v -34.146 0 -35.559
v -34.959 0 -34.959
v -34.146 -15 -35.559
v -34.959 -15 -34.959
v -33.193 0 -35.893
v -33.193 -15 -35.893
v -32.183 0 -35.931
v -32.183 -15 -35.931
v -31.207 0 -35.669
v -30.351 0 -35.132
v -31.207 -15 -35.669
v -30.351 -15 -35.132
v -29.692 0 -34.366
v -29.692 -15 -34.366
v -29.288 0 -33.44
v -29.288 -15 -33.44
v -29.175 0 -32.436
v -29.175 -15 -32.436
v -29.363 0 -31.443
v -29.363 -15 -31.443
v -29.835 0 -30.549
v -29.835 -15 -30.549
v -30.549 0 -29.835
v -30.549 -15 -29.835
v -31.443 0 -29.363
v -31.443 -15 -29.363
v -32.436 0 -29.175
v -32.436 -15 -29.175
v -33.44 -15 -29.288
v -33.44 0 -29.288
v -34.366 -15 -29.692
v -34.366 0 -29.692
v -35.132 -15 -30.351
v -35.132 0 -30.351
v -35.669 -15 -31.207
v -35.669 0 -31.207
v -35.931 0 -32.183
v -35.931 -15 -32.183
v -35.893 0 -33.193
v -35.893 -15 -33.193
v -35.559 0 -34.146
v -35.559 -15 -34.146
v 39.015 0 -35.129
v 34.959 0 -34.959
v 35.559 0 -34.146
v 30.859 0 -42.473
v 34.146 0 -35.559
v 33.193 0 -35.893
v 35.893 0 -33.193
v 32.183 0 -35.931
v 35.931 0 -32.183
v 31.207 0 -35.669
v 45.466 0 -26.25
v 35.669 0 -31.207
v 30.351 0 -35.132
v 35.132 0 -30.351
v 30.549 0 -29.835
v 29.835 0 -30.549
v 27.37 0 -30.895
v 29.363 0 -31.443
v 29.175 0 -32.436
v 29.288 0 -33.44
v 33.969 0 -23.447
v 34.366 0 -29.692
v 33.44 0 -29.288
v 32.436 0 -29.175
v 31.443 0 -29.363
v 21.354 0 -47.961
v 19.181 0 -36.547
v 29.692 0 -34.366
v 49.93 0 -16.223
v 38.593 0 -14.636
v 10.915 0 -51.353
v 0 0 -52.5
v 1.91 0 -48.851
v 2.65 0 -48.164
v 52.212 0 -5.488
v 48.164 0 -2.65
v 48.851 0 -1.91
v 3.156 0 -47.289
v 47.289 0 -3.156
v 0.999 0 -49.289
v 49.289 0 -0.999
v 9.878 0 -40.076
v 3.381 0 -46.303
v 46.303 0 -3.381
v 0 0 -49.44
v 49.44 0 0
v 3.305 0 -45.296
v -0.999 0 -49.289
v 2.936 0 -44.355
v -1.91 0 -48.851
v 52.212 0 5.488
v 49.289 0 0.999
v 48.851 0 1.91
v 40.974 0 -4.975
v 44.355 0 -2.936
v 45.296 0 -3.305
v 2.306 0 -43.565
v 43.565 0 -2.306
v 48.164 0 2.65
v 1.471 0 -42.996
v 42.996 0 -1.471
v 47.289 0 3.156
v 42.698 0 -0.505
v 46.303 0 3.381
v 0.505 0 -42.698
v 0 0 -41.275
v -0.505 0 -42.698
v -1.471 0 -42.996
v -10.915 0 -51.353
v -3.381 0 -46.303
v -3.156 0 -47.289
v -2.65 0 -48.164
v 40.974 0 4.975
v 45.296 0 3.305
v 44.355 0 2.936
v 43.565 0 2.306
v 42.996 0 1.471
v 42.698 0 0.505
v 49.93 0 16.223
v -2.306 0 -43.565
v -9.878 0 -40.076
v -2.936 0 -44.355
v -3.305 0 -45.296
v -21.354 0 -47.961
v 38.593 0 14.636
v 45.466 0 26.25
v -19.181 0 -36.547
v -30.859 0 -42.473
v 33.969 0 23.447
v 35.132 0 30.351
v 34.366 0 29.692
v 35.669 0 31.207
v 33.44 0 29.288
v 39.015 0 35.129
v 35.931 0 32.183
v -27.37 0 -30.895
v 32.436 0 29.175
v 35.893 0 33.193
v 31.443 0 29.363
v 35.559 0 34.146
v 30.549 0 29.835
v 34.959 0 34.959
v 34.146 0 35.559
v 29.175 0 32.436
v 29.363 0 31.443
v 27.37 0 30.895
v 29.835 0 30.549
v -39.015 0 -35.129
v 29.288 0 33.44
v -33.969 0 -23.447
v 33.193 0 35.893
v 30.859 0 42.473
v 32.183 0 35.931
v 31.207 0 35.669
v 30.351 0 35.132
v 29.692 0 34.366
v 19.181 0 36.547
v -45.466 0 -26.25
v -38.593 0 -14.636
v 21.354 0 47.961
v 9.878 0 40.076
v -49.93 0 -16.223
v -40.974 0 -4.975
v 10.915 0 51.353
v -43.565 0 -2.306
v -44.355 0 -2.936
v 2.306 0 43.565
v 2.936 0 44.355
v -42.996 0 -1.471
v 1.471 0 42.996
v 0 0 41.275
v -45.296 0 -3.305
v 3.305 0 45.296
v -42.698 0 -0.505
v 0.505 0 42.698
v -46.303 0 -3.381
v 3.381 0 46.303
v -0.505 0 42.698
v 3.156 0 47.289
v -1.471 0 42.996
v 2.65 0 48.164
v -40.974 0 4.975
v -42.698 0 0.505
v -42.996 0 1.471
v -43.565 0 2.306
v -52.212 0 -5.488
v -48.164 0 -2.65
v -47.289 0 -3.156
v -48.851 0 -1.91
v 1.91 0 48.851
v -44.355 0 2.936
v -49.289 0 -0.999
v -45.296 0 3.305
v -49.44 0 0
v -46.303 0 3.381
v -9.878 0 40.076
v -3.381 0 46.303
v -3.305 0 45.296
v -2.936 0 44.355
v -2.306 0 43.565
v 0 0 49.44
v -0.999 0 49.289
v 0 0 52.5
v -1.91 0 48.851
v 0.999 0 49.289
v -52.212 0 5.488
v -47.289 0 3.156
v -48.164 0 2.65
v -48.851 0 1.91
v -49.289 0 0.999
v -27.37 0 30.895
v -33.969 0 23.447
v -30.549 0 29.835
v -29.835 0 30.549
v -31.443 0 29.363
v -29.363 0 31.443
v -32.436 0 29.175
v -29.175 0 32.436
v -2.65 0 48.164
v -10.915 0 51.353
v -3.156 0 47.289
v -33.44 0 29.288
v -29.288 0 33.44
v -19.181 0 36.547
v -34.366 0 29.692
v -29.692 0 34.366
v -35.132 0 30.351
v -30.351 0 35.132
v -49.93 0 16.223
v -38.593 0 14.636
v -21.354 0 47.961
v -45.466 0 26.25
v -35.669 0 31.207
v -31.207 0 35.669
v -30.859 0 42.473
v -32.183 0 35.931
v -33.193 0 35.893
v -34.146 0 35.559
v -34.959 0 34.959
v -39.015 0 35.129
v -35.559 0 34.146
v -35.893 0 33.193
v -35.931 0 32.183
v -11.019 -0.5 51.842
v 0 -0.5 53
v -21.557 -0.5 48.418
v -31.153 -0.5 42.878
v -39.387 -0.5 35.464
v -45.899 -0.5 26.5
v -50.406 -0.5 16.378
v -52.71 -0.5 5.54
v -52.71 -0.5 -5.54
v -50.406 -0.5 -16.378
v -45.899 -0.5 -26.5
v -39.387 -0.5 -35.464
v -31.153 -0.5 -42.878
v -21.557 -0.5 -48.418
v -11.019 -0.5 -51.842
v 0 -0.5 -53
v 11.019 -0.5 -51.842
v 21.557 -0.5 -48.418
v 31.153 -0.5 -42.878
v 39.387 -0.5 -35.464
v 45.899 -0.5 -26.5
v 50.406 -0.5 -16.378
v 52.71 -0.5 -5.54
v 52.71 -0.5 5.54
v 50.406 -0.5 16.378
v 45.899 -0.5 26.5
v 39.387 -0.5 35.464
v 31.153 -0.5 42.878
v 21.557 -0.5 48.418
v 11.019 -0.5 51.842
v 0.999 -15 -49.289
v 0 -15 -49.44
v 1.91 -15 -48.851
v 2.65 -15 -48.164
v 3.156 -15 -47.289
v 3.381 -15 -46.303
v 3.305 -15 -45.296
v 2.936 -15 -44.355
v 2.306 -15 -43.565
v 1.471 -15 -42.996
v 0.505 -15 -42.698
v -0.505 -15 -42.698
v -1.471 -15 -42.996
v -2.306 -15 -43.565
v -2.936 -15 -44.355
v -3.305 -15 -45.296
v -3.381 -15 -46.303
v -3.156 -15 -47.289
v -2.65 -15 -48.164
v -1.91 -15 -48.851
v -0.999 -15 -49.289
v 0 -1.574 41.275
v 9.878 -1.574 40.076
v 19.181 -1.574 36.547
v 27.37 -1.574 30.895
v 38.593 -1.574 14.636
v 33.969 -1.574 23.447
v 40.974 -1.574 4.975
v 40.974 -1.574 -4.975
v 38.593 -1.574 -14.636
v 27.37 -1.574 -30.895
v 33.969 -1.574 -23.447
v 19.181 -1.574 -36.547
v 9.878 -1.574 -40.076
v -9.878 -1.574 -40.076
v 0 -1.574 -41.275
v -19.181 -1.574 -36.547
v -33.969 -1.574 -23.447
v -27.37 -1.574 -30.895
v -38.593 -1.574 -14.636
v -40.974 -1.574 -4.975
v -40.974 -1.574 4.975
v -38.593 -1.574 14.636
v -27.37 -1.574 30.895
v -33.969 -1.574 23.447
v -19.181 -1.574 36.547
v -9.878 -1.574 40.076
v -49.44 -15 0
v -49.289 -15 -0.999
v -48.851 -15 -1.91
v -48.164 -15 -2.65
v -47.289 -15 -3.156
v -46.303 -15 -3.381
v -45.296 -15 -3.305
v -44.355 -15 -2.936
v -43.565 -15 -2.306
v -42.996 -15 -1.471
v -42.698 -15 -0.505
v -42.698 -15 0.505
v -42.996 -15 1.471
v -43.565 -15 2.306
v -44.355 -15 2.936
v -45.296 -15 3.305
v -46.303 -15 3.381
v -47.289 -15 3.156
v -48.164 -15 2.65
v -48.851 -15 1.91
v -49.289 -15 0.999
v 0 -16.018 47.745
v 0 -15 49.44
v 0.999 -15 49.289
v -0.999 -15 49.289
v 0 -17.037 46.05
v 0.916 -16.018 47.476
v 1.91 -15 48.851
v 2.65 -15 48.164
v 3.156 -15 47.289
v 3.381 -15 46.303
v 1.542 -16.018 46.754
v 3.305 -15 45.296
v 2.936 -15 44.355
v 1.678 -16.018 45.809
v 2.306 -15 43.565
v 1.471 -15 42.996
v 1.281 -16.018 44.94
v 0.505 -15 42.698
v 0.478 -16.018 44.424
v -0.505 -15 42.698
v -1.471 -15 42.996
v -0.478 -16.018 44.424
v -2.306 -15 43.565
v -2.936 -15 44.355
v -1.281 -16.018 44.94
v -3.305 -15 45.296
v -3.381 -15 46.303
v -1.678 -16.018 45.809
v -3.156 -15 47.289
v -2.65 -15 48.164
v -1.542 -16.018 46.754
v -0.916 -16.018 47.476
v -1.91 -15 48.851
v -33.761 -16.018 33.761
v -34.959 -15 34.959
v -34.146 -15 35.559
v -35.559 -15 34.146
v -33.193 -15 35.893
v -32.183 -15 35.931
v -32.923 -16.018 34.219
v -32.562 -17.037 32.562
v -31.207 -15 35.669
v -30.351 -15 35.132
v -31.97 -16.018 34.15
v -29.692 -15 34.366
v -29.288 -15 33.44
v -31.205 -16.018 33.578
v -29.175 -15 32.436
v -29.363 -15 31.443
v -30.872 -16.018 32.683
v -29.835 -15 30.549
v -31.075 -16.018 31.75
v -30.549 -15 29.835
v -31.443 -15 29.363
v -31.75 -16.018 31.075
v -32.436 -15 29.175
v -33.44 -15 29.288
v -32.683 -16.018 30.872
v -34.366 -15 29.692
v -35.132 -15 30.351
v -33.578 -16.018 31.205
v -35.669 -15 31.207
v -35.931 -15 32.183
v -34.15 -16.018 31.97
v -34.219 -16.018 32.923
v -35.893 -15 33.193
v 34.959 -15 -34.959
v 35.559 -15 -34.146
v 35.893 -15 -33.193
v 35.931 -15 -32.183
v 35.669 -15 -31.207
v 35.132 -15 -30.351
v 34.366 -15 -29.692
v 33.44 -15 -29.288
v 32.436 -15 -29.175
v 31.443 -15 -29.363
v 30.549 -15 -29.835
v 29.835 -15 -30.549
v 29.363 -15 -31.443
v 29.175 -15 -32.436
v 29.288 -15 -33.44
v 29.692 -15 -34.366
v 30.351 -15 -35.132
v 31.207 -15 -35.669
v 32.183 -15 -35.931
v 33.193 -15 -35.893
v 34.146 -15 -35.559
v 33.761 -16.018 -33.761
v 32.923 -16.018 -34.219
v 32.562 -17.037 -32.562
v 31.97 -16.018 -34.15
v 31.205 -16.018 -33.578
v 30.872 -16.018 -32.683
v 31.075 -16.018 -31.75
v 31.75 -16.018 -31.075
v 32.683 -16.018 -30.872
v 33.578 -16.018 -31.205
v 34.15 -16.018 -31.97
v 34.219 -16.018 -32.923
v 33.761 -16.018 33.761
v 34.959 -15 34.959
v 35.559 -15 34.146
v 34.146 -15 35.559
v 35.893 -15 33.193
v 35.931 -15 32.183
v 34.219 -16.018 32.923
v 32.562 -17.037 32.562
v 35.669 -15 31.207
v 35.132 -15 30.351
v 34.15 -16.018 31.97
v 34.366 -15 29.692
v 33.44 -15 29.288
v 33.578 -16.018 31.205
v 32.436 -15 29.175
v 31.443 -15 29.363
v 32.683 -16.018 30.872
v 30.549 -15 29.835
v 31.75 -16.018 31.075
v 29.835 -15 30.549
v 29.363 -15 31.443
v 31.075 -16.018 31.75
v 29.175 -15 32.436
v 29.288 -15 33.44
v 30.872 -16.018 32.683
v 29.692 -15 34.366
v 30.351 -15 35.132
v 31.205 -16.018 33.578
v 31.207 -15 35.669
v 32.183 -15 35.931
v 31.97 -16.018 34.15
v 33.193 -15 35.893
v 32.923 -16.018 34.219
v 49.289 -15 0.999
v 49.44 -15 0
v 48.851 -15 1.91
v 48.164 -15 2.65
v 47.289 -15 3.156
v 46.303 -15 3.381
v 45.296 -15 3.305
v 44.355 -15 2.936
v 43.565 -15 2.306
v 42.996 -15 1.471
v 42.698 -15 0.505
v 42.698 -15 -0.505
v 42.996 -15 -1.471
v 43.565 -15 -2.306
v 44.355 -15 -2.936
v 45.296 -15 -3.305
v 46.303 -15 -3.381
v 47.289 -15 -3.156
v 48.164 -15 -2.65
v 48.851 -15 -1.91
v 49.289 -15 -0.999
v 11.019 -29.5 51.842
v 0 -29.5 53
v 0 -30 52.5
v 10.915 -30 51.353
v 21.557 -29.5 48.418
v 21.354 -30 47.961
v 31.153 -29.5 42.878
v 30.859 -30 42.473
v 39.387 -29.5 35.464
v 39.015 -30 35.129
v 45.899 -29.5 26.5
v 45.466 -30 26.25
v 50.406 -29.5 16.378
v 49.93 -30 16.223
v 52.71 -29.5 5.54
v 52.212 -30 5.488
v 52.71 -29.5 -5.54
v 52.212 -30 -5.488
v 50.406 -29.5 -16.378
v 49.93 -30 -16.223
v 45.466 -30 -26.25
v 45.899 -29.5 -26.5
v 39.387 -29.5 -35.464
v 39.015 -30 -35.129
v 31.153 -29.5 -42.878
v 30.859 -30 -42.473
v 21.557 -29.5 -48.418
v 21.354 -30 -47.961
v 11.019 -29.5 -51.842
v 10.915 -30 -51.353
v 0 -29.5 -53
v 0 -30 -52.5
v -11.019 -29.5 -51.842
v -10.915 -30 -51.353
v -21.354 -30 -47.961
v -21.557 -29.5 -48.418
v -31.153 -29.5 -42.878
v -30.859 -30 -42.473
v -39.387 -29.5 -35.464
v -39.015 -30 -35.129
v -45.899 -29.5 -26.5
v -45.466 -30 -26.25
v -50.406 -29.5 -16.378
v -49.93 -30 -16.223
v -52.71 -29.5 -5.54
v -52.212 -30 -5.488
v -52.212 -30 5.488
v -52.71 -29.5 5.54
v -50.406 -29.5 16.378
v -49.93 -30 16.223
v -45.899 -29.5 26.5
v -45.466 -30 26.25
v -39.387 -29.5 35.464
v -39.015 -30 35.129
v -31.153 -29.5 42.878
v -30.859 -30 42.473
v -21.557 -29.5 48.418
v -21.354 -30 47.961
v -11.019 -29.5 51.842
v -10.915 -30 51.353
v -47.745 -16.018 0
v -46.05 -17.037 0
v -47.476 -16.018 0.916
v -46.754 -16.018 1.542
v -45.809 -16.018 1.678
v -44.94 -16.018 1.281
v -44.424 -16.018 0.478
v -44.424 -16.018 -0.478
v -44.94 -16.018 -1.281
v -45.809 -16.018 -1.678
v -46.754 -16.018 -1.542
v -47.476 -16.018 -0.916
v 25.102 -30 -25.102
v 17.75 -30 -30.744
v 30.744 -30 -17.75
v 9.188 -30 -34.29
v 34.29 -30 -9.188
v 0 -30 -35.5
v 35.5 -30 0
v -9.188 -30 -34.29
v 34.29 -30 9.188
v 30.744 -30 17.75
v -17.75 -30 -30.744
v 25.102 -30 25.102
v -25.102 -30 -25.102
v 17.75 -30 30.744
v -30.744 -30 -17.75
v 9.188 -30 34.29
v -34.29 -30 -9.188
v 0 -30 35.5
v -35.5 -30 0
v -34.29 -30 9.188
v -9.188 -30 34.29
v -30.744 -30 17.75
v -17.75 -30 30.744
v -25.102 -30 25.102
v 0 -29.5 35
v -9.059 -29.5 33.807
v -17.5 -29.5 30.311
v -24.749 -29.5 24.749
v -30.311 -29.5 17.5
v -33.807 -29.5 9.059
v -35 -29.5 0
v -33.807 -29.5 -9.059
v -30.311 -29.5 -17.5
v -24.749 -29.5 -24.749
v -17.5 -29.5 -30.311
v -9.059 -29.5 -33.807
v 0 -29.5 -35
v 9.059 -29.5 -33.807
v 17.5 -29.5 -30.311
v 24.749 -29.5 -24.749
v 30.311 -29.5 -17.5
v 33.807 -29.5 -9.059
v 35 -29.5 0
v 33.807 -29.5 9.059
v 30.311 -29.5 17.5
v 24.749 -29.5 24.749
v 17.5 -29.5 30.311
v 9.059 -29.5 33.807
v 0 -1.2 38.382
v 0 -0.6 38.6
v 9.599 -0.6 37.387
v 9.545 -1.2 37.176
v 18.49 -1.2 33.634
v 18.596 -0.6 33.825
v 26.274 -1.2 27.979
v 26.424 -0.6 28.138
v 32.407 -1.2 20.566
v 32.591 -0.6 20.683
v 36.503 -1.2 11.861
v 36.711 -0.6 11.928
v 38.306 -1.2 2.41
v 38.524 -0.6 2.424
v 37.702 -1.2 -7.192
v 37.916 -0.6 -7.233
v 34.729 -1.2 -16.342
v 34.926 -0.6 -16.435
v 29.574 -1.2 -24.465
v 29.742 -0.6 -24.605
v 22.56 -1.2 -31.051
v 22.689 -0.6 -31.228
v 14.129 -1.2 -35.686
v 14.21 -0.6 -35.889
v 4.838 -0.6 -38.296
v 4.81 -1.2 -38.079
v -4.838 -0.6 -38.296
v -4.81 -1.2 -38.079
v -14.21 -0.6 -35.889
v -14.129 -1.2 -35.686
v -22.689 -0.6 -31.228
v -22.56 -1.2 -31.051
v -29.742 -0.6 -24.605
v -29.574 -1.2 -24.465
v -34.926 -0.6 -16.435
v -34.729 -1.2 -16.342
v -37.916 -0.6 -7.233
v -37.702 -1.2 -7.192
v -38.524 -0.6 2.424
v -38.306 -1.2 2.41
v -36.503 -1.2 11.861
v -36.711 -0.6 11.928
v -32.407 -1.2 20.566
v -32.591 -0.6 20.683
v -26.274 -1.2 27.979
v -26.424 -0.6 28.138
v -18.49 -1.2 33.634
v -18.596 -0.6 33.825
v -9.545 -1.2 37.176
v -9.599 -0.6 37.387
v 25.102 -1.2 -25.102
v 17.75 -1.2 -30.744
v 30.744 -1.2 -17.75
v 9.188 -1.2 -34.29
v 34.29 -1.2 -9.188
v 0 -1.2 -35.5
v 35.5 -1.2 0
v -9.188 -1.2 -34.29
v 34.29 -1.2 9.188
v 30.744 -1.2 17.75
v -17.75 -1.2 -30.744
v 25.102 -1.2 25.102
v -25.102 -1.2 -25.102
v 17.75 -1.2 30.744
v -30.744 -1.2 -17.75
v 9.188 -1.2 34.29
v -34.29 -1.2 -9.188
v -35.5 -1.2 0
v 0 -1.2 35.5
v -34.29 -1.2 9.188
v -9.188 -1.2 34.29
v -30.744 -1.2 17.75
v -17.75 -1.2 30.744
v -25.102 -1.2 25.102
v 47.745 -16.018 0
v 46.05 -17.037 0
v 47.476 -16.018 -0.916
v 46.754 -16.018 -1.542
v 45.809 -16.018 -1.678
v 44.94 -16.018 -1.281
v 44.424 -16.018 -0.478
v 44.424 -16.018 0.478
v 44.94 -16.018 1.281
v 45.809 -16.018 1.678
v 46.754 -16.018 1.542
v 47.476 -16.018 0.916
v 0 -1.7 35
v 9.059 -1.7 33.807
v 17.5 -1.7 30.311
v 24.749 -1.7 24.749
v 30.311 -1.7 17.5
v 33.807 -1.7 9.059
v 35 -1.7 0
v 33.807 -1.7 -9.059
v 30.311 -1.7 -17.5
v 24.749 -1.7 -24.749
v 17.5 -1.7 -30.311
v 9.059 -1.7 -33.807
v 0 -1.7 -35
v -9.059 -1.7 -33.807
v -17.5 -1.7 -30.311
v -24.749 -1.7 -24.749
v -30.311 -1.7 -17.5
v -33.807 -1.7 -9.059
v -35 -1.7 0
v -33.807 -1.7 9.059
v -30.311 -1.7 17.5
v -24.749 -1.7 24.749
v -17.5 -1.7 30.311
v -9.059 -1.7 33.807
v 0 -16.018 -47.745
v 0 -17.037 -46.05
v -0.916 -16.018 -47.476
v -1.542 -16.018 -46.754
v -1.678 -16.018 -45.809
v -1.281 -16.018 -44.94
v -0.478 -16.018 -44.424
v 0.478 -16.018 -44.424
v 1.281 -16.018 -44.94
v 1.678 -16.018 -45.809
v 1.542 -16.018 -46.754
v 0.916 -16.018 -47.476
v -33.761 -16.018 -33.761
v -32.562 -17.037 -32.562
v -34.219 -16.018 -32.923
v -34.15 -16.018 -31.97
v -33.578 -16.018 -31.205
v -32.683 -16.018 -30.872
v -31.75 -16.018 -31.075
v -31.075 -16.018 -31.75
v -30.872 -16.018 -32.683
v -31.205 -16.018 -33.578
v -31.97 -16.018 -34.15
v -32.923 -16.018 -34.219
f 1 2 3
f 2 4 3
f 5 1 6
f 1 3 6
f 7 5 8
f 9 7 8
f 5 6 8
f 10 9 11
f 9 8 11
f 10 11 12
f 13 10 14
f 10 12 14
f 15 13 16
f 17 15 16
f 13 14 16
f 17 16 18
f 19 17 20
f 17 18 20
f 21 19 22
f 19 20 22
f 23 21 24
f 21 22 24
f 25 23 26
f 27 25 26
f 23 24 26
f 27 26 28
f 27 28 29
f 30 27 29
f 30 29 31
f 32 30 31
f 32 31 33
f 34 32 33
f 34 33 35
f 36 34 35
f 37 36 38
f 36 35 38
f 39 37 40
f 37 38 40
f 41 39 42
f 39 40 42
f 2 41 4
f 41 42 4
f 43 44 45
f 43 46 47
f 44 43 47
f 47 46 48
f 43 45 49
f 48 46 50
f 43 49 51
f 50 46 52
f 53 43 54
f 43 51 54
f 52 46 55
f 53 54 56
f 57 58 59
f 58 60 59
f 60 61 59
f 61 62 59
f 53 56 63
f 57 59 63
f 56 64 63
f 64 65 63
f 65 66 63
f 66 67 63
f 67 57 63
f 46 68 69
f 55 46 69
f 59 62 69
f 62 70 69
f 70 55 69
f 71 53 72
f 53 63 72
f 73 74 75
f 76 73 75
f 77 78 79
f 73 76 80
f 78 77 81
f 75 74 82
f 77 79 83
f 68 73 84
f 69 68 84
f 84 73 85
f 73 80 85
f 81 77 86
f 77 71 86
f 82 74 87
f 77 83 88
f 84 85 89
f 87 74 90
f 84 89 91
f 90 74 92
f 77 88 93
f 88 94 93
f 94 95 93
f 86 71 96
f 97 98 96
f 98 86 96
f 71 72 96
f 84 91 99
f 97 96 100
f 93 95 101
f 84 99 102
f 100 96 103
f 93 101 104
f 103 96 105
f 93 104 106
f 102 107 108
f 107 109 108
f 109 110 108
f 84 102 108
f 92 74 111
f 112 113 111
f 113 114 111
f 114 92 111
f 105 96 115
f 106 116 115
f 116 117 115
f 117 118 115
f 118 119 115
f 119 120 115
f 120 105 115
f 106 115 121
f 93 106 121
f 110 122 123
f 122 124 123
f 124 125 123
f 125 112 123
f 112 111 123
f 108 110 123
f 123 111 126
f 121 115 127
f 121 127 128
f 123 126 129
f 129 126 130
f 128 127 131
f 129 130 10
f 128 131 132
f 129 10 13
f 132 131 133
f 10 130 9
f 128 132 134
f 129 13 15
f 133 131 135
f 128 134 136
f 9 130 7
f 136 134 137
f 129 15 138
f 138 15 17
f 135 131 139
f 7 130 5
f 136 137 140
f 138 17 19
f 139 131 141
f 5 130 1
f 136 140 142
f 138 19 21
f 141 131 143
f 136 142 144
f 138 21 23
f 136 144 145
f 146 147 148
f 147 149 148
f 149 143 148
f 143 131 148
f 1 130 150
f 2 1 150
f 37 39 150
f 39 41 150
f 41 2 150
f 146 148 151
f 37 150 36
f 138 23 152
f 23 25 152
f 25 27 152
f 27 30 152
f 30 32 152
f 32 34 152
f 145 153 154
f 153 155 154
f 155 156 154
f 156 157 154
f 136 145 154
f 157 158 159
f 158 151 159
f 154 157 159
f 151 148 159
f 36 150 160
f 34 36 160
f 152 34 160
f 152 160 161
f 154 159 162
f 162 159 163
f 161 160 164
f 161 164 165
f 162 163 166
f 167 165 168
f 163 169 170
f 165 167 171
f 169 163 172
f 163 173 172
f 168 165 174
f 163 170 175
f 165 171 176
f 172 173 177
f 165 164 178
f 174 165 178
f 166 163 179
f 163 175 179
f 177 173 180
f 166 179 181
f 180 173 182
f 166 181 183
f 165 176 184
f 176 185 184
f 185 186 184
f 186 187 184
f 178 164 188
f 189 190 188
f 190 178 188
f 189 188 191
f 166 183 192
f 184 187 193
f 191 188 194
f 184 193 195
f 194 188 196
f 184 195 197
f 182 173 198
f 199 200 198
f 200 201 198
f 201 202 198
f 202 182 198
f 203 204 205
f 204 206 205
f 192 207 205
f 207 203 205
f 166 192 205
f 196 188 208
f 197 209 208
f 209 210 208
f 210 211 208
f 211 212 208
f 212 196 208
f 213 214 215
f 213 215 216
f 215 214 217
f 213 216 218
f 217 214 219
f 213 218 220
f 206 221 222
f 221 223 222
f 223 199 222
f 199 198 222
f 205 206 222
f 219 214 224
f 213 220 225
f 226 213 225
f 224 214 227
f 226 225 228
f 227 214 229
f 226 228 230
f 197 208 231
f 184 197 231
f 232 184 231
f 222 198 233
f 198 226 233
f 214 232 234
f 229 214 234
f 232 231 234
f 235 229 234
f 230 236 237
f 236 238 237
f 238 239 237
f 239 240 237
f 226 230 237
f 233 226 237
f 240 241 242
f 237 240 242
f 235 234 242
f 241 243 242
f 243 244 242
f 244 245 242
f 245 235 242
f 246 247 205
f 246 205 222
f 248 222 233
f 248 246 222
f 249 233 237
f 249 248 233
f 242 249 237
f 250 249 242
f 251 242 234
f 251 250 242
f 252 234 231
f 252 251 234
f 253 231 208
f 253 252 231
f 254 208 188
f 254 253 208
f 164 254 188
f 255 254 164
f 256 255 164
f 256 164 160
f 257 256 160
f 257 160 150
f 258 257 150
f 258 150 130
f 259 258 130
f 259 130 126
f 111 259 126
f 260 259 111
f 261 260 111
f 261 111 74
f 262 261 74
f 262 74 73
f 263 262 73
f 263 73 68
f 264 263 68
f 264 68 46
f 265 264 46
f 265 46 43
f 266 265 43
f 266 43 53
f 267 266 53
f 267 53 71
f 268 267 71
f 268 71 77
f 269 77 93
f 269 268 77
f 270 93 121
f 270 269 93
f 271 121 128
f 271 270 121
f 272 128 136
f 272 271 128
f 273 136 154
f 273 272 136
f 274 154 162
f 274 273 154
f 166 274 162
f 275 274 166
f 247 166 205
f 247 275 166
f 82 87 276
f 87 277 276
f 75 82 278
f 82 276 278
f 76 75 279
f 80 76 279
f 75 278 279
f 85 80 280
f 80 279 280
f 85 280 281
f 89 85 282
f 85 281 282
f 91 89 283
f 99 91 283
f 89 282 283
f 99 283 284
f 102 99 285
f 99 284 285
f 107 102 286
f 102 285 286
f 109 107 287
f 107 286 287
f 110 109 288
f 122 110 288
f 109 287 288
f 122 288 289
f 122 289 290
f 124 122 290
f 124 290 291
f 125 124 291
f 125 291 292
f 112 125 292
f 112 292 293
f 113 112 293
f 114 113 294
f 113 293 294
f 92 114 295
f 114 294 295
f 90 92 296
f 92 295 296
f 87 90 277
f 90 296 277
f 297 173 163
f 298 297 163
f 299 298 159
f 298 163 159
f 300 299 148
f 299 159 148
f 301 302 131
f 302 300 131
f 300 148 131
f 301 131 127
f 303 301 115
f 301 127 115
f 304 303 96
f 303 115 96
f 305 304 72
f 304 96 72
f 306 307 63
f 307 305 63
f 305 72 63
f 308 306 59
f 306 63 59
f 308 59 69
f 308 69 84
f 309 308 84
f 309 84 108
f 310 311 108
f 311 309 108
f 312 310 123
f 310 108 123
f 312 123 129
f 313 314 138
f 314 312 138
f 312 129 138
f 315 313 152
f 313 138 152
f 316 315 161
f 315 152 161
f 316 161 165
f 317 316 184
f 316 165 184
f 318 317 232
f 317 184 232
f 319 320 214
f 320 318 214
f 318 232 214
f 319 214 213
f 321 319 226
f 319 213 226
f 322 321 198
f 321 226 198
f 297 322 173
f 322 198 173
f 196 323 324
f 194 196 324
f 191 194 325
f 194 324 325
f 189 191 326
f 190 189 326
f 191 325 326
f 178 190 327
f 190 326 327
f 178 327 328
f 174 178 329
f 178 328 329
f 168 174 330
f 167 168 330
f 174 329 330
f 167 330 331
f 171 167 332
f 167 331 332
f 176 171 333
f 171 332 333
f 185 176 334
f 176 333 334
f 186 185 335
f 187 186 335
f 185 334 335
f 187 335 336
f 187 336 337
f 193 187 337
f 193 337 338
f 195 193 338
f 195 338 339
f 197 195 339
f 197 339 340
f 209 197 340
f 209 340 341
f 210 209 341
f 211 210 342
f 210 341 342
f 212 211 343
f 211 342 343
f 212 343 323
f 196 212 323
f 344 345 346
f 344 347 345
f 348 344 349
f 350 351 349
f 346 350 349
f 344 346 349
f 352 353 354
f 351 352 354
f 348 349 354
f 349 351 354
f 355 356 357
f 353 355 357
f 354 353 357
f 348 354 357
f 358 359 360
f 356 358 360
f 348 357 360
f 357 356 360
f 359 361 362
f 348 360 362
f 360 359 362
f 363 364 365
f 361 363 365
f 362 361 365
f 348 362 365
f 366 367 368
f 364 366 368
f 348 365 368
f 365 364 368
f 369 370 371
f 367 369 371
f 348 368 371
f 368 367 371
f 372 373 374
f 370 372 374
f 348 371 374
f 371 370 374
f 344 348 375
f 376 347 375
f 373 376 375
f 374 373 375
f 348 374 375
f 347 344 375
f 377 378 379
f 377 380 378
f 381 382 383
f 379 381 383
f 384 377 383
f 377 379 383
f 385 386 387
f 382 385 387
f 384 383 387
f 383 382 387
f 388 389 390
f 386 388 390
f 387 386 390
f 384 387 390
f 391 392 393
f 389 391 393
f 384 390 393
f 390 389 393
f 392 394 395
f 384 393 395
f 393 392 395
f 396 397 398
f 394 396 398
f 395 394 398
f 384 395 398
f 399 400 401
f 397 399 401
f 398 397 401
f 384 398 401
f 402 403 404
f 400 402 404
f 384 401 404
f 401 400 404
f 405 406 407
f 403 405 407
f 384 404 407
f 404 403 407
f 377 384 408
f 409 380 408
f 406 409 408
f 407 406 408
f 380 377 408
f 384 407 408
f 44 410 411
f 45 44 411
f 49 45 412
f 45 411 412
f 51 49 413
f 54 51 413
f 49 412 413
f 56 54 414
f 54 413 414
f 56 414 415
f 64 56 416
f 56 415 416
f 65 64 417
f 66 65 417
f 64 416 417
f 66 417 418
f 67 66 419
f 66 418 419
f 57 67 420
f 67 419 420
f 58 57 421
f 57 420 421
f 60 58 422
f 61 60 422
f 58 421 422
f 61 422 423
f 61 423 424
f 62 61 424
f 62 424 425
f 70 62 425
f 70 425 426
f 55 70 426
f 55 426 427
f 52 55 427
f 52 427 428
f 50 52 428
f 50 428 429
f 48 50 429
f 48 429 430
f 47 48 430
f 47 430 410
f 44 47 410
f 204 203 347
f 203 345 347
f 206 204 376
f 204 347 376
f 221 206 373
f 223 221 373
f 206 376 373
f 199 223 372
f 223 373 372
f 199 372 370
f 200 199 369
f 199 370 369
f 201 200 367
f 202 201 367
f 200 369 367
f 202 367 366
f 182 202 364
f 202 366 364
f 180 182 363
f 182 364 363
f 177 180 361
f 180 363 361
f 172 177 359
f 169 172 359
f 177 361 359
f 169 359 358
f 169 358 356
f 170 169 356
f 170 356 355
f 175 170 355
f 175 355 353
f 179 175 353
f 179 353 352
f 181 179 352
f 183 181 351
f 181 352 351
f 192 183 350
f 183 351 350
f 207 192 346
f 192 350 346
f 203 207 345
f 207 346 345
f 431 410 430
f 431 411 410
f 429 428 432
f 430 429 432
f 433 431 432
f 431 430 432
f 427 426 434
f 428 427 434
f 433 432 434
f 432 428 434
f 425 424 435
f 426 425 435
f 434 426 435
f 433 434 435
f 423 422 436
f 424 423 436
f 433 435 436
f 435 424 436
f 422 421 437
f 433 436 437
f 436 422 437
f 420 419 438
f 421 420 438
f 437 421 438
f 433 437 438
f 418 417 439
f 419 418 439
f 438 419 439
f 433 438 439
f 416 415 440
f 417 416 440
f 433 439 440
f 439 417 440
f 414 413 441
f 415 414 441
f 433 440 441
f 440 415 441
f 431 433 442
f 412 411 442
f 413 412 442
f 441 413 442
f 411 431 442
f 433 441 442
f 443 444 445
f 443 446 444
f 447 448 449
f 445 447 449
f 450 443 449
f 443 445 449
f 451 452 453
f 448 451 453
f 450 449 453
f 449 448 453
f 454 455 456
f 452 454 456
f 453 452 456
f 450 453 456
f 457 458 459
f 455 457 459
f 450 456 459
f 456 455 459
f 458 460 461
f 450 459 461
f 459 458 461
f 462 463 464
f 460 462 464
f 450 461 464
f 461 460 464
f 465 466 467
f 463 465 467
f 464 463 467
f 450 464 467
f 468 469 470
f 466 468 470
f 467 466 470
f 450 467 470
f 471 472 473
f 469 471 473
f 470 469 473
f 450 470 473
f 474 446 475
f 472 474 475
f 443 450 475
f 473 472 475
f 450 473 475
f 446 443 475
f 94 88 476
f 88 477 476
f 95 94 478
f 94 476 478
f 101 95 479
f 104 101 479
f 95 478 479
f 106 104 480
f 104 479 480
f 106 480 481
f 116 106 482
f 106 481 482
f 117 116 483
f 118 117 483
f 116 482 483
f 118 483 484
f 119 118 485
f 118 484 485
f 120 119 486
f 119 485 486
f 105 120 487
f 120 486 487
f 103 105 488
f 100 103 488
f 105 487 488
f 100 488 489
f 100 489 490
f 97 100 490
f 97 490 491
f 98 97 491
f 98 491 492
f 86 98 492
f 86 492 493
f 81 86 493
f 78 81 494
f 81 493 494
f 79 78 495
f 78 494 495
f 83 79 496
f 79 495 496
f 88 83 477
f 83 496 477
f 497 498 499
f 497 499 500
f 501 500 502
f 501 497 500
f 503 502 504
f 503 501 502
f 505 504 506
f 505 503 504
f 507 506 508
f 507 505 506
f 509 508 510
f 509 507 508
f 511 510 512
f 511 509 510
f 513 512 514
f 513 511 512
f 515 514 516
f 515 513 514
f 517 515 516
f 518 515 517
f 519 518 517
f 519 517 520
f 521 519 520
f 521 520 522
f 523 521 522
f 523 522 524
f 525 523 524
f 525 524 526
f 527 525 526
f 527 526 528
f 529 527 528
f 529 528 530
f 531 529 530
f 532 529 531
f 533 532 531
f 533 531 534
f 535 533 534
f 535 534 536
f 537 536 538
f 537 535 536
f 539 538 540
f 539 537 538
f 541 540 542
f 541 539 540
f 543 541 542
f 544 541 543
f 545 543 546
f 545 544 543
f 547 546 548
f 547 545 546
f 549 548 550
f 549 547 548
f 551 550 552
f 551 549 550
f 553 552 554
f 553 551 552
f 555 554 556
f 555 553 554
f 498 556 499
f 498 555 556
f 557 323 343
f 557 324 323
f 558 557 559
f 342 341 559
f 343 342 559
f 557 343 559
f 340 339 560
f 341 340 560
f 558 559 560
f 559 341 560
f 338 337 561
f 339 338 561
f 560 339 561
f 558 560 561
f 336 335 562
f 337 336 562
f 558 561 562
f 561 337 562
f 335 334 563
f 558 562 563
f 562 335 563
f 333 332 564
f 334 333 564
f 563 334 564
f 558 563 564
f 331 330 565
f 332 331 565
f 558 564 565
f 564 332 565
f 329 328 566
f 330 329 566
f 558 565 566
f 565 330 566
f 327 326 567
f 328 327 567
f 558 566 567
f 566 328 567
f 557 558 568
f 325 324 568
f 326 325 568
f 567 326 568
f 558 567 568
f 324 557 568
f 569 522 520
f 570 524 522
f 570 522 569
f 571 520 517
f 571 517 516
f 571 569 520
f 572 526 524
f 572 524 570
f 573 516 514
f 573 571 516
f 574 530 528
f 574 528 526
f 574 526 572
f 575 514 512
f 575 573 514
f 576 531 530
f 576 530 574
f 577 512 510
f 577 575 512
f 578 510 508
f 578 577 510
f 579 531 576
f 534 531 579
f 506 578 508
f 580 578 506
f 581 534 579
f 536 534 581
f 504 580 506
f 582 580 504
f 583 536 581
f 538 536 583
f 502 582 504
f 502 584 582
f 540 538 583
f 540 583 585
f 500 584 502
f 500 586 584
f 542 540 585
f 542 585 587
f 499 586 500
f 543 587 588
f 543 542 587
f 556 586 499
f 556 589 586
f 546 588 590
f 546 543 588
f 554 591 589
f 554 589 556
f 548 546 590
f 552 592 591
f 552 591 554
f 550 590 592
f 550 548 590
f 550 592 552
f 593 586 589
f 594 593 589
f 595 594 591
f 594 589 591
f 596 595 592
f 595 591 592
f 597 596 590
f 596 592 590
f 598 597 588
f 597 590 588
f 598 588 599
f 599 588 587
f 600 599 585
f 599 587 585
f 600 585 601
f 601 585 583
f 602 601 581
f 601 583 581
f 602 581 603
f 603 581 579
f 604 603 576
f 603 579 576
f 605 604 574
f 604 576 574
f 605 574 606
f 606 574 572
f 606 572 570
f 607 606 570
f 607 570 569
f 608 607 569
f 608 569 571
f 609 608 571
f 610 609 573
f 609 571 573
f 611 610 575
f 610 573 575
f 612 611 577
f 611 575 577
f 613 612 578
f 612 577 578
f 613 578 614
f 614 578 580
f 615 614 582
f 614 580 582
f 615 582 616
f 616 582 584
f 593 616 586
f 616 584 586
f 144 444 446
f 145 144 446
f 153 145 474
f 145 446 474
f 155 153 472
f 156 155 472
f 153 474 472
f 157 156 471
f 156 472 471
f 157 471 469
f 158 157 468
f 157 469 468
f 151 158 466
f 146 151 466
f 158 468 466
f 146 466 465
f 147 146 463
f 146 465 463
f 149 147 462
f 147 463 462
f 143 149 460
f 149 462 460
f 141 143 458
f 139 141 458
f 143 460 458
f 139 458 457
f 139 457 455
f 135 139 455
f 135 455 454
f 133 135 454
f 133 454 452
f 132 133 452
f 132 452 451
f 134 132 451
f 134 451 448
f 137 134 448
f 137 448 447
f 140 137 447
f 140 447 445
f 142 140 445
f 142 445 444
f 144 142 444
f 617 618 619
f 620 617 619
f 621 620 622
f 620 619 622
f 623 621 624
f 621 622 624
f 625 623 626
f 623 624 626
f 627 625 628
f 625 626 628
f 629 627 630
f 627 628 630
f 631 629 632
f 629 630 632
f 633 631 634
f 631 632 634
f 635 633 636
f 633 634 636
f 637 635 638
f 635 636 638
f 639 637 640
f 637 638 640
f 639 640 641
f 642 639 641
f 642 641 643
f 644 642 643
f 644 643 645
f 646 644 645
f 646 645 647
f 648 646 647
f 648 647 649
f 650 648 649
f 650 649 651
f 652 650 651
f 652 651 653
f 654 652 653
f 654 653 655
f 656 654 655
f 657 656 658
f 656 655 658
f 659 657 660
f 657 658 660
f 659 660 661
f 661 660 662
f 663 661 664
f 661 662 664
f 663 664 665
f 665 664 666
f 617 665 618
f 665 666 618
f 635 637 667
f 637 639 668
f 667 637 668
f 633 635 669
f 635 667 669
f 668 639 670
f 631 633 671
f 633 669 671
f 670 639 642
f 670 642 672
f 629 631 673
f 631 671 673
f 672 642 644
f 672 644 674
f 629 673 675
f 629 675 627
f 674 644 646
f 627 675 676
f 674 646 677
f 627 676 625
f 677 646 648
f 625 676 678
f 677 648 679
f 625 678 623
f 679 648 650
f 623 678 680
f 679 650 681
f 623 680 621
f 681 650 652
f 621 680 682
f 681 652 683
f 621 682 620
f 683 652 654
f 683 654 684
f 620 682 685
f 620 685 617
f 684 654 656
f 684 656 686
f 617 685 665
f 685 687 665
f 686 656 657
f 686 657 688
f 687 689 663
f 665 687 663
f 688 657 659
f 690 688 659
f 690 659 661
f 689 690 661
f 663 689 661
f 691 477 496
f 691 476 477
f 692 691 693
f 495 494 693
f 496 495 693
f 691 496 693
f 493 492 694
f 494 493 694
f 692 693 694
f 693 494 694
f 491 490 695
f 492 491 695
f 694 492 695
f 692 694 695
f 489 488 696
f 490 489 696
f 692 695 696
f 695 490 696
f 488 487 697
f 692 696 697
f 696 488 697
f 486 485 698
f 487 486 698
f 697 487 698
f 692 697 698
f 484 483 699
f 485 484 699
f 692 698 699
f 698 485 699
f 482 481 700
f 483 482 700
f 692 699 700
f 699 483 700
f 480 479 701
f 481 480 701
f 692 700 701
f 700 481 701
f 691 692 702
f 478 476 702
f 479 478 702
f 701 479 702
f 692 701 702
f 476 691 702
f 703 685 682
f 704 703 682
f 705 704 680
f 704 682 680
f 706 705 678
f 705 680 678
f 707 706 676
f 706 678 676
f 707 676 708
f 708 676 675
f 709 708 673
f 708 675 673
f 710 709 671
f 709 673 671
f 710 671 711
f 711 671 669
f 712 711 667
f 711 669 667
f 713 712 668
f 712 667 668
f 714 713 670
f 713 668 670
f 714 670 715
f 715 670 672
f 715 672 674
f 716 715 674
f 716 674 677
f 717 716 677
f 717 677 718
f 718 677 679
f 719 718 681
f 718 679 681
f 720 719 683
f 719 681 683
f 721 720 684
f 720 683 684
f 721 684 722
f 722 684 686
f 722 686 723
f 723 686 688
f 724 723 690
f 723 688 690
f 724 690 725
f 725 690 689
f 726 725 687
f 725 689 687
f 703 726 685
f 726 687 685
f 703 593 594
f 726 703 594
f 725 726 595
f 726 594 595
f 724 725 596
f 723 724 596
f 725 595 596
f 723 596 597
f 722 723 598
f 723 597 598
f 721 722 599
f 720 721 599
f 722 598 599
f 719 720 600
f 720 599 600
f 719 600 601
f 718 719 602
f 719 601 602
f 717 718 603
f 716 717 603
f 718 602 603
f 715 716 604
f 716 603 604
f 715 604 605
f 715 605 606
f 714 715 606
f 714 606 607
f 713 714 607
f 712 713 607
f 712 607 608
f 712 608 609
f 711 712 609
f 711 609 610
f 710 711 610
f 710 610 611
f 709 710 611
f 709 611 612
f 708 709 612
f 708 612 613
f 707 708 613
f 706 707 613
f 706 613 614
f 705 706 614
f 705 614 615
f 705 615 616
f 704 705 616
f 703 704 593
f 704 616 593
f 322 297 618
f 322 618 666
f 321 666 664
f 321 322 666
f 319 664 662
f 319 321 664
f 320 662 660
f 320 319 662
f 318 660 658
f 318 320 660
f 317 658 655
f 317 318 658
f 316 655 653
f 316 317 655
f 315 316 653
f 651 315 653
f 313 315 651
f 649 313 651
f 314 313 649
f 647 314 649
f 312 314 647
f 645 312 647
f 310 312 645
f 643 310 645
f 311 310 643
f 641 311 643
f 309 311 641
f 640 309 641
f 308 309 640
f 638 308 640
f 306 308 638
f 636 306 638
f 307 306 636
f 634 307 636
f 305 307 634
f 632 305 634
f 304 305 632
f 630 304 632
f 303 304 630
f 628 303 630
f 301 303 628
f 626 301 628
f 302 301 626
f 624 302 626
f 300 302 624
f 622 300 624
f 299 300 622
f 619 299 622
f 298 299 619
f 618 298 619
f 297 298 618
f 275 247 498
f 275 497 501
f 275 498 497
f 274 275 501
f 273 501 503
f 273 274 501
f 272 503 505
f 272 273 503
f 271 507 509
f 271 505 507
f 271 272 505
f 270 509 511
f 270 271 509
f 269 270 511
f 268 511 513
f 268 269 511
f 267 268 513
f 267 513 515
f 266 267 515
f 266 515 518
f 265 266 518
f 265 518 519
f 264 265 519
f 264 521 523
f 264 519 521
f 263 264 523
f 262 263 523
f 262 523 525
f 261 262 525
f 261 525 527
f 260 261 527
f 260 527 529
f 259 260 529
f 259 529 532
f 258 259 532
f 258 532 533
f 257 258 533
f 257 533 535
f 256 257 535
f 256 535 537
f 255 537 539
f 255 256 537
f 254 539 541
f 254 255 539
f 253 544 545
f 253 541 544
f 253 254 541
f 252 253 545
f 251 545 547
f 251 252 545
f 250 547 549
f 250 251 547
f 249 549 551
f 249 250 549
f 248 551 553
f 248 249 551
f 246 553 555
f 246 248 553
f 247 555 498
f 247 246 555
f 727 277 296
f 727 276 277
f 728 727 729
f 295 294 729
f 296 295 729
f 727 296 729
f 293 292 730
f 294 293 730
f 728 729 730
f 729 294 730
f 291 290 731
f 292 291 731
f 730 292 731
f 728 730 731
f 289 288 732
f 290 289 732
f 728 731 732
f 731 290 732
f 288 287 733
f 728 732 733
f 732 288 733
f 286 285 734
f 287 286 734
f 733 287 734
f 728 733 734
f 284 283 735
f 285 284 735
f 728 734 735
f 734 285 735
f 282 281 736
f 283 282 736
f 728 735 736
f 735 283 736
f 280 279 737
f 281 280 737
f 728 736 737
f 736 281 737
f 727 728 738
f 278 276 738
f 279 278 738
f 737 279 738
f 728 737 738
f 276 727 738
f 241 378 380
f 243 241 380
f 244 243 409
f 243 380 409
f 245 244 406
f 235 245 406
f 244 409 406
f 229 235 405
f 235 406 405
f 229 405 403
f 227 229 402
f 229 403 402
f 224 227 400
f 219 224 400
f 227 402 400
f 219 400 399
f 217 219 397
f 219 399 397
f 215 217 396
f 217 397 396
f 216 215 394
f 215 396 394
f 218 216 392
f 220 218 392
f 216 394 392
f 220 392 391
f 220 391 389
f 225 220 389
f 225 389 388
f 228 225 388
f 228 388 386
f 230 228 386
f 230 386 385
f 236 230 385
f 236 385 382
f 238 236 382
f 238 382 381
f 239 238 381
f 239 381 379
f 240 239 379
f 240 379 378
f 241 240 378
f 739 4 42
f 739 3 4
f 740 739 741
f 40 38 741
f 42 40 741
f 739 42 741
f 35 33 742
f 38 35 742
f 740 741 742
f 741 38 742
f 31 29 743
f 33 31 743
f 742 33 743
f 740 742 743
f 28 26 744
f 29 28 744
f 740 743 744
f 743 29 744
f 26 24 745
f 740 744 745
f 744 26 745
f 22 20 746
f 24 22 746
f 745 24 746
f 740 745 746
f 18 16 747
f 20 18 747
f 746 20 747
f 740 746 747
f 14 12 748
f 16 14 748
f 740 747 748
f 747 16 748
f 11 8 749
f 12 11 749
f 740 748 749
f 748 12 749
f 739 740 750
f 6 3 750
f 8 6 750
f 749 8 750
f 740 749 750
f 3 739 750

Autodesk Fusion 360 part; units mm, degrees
sketch "CF63 Profile" plane through (0, 0, 0) normal (1, 0, 0) x (0, 0, -1)
  line L0 (-38.3816, -1.2) -> (-38.6, -0.6)
  line L1 (-50.25, -30) -> (-50.25, 0)
  line L2 (-38.3816, -1.2) -> (0, -1.2)
  line L3 (-41.85, 0) -> (-41.85, -30)
  line L4 (-41.275, -1.5736) -> (-38.6, -0.6)
  line L5 (-50.25, 0) -> (-41.275, 0)
  line L6 (-41.275, -1.5736) -> (-41.275, 0)
  line L7 (-46.05, 0) -> (-46.05, -30)
  line L8 (0, 0) -> (0, -30)
  line L9 (0, -30) -> (-53, -30)
  line L10 (-53, -30) -> (-53, 0)
  line L11 (-53, 0) -> (-50.25, 0)
  line L12 (-35, -1.2) -> (-35, -30)
  dimension "d1" = 30
  dimension "d2" = 53
  dimension "d3" = 35
revolve "Revolve1" add sketch "CF63 Profile" angle 360 about axis through (0, 0, 0) along (0, -1, 0) contours L0 L2 L3 L4 L5 L6 L9 L12 | L3 L5 L7 L9 | L1 L5 L7 L9 | L1 L9 L10 L11
chamfer "Chamfer1" distance 0.5 angle 45 4 edges at (-32.6315, -1.2, 12.6565) (-32.6315, -30, 12.6565) (-49.4133, 0, 19.1656) (-49.4133, -30, 19.1656)
sketch "Sketch2" plane through (0, 0, 0) normal (0, 1, 0) x (-1, 0, 0)
  circle A0 centre (0, 0) radius 41.275
  circle A1 centre (0, 0) radius 52.5
  point P0 (0, 46.05)
hole "Hole1" at (0, 0, 46.05) direction (0, -1, 0) diameter 6.78 depth 15 tip angle 118
pattern_circular "C-Pattern2" count 8 over 360 about axis through (0, 1.75, 0) along (0, 1, 0) of "Hole1"
